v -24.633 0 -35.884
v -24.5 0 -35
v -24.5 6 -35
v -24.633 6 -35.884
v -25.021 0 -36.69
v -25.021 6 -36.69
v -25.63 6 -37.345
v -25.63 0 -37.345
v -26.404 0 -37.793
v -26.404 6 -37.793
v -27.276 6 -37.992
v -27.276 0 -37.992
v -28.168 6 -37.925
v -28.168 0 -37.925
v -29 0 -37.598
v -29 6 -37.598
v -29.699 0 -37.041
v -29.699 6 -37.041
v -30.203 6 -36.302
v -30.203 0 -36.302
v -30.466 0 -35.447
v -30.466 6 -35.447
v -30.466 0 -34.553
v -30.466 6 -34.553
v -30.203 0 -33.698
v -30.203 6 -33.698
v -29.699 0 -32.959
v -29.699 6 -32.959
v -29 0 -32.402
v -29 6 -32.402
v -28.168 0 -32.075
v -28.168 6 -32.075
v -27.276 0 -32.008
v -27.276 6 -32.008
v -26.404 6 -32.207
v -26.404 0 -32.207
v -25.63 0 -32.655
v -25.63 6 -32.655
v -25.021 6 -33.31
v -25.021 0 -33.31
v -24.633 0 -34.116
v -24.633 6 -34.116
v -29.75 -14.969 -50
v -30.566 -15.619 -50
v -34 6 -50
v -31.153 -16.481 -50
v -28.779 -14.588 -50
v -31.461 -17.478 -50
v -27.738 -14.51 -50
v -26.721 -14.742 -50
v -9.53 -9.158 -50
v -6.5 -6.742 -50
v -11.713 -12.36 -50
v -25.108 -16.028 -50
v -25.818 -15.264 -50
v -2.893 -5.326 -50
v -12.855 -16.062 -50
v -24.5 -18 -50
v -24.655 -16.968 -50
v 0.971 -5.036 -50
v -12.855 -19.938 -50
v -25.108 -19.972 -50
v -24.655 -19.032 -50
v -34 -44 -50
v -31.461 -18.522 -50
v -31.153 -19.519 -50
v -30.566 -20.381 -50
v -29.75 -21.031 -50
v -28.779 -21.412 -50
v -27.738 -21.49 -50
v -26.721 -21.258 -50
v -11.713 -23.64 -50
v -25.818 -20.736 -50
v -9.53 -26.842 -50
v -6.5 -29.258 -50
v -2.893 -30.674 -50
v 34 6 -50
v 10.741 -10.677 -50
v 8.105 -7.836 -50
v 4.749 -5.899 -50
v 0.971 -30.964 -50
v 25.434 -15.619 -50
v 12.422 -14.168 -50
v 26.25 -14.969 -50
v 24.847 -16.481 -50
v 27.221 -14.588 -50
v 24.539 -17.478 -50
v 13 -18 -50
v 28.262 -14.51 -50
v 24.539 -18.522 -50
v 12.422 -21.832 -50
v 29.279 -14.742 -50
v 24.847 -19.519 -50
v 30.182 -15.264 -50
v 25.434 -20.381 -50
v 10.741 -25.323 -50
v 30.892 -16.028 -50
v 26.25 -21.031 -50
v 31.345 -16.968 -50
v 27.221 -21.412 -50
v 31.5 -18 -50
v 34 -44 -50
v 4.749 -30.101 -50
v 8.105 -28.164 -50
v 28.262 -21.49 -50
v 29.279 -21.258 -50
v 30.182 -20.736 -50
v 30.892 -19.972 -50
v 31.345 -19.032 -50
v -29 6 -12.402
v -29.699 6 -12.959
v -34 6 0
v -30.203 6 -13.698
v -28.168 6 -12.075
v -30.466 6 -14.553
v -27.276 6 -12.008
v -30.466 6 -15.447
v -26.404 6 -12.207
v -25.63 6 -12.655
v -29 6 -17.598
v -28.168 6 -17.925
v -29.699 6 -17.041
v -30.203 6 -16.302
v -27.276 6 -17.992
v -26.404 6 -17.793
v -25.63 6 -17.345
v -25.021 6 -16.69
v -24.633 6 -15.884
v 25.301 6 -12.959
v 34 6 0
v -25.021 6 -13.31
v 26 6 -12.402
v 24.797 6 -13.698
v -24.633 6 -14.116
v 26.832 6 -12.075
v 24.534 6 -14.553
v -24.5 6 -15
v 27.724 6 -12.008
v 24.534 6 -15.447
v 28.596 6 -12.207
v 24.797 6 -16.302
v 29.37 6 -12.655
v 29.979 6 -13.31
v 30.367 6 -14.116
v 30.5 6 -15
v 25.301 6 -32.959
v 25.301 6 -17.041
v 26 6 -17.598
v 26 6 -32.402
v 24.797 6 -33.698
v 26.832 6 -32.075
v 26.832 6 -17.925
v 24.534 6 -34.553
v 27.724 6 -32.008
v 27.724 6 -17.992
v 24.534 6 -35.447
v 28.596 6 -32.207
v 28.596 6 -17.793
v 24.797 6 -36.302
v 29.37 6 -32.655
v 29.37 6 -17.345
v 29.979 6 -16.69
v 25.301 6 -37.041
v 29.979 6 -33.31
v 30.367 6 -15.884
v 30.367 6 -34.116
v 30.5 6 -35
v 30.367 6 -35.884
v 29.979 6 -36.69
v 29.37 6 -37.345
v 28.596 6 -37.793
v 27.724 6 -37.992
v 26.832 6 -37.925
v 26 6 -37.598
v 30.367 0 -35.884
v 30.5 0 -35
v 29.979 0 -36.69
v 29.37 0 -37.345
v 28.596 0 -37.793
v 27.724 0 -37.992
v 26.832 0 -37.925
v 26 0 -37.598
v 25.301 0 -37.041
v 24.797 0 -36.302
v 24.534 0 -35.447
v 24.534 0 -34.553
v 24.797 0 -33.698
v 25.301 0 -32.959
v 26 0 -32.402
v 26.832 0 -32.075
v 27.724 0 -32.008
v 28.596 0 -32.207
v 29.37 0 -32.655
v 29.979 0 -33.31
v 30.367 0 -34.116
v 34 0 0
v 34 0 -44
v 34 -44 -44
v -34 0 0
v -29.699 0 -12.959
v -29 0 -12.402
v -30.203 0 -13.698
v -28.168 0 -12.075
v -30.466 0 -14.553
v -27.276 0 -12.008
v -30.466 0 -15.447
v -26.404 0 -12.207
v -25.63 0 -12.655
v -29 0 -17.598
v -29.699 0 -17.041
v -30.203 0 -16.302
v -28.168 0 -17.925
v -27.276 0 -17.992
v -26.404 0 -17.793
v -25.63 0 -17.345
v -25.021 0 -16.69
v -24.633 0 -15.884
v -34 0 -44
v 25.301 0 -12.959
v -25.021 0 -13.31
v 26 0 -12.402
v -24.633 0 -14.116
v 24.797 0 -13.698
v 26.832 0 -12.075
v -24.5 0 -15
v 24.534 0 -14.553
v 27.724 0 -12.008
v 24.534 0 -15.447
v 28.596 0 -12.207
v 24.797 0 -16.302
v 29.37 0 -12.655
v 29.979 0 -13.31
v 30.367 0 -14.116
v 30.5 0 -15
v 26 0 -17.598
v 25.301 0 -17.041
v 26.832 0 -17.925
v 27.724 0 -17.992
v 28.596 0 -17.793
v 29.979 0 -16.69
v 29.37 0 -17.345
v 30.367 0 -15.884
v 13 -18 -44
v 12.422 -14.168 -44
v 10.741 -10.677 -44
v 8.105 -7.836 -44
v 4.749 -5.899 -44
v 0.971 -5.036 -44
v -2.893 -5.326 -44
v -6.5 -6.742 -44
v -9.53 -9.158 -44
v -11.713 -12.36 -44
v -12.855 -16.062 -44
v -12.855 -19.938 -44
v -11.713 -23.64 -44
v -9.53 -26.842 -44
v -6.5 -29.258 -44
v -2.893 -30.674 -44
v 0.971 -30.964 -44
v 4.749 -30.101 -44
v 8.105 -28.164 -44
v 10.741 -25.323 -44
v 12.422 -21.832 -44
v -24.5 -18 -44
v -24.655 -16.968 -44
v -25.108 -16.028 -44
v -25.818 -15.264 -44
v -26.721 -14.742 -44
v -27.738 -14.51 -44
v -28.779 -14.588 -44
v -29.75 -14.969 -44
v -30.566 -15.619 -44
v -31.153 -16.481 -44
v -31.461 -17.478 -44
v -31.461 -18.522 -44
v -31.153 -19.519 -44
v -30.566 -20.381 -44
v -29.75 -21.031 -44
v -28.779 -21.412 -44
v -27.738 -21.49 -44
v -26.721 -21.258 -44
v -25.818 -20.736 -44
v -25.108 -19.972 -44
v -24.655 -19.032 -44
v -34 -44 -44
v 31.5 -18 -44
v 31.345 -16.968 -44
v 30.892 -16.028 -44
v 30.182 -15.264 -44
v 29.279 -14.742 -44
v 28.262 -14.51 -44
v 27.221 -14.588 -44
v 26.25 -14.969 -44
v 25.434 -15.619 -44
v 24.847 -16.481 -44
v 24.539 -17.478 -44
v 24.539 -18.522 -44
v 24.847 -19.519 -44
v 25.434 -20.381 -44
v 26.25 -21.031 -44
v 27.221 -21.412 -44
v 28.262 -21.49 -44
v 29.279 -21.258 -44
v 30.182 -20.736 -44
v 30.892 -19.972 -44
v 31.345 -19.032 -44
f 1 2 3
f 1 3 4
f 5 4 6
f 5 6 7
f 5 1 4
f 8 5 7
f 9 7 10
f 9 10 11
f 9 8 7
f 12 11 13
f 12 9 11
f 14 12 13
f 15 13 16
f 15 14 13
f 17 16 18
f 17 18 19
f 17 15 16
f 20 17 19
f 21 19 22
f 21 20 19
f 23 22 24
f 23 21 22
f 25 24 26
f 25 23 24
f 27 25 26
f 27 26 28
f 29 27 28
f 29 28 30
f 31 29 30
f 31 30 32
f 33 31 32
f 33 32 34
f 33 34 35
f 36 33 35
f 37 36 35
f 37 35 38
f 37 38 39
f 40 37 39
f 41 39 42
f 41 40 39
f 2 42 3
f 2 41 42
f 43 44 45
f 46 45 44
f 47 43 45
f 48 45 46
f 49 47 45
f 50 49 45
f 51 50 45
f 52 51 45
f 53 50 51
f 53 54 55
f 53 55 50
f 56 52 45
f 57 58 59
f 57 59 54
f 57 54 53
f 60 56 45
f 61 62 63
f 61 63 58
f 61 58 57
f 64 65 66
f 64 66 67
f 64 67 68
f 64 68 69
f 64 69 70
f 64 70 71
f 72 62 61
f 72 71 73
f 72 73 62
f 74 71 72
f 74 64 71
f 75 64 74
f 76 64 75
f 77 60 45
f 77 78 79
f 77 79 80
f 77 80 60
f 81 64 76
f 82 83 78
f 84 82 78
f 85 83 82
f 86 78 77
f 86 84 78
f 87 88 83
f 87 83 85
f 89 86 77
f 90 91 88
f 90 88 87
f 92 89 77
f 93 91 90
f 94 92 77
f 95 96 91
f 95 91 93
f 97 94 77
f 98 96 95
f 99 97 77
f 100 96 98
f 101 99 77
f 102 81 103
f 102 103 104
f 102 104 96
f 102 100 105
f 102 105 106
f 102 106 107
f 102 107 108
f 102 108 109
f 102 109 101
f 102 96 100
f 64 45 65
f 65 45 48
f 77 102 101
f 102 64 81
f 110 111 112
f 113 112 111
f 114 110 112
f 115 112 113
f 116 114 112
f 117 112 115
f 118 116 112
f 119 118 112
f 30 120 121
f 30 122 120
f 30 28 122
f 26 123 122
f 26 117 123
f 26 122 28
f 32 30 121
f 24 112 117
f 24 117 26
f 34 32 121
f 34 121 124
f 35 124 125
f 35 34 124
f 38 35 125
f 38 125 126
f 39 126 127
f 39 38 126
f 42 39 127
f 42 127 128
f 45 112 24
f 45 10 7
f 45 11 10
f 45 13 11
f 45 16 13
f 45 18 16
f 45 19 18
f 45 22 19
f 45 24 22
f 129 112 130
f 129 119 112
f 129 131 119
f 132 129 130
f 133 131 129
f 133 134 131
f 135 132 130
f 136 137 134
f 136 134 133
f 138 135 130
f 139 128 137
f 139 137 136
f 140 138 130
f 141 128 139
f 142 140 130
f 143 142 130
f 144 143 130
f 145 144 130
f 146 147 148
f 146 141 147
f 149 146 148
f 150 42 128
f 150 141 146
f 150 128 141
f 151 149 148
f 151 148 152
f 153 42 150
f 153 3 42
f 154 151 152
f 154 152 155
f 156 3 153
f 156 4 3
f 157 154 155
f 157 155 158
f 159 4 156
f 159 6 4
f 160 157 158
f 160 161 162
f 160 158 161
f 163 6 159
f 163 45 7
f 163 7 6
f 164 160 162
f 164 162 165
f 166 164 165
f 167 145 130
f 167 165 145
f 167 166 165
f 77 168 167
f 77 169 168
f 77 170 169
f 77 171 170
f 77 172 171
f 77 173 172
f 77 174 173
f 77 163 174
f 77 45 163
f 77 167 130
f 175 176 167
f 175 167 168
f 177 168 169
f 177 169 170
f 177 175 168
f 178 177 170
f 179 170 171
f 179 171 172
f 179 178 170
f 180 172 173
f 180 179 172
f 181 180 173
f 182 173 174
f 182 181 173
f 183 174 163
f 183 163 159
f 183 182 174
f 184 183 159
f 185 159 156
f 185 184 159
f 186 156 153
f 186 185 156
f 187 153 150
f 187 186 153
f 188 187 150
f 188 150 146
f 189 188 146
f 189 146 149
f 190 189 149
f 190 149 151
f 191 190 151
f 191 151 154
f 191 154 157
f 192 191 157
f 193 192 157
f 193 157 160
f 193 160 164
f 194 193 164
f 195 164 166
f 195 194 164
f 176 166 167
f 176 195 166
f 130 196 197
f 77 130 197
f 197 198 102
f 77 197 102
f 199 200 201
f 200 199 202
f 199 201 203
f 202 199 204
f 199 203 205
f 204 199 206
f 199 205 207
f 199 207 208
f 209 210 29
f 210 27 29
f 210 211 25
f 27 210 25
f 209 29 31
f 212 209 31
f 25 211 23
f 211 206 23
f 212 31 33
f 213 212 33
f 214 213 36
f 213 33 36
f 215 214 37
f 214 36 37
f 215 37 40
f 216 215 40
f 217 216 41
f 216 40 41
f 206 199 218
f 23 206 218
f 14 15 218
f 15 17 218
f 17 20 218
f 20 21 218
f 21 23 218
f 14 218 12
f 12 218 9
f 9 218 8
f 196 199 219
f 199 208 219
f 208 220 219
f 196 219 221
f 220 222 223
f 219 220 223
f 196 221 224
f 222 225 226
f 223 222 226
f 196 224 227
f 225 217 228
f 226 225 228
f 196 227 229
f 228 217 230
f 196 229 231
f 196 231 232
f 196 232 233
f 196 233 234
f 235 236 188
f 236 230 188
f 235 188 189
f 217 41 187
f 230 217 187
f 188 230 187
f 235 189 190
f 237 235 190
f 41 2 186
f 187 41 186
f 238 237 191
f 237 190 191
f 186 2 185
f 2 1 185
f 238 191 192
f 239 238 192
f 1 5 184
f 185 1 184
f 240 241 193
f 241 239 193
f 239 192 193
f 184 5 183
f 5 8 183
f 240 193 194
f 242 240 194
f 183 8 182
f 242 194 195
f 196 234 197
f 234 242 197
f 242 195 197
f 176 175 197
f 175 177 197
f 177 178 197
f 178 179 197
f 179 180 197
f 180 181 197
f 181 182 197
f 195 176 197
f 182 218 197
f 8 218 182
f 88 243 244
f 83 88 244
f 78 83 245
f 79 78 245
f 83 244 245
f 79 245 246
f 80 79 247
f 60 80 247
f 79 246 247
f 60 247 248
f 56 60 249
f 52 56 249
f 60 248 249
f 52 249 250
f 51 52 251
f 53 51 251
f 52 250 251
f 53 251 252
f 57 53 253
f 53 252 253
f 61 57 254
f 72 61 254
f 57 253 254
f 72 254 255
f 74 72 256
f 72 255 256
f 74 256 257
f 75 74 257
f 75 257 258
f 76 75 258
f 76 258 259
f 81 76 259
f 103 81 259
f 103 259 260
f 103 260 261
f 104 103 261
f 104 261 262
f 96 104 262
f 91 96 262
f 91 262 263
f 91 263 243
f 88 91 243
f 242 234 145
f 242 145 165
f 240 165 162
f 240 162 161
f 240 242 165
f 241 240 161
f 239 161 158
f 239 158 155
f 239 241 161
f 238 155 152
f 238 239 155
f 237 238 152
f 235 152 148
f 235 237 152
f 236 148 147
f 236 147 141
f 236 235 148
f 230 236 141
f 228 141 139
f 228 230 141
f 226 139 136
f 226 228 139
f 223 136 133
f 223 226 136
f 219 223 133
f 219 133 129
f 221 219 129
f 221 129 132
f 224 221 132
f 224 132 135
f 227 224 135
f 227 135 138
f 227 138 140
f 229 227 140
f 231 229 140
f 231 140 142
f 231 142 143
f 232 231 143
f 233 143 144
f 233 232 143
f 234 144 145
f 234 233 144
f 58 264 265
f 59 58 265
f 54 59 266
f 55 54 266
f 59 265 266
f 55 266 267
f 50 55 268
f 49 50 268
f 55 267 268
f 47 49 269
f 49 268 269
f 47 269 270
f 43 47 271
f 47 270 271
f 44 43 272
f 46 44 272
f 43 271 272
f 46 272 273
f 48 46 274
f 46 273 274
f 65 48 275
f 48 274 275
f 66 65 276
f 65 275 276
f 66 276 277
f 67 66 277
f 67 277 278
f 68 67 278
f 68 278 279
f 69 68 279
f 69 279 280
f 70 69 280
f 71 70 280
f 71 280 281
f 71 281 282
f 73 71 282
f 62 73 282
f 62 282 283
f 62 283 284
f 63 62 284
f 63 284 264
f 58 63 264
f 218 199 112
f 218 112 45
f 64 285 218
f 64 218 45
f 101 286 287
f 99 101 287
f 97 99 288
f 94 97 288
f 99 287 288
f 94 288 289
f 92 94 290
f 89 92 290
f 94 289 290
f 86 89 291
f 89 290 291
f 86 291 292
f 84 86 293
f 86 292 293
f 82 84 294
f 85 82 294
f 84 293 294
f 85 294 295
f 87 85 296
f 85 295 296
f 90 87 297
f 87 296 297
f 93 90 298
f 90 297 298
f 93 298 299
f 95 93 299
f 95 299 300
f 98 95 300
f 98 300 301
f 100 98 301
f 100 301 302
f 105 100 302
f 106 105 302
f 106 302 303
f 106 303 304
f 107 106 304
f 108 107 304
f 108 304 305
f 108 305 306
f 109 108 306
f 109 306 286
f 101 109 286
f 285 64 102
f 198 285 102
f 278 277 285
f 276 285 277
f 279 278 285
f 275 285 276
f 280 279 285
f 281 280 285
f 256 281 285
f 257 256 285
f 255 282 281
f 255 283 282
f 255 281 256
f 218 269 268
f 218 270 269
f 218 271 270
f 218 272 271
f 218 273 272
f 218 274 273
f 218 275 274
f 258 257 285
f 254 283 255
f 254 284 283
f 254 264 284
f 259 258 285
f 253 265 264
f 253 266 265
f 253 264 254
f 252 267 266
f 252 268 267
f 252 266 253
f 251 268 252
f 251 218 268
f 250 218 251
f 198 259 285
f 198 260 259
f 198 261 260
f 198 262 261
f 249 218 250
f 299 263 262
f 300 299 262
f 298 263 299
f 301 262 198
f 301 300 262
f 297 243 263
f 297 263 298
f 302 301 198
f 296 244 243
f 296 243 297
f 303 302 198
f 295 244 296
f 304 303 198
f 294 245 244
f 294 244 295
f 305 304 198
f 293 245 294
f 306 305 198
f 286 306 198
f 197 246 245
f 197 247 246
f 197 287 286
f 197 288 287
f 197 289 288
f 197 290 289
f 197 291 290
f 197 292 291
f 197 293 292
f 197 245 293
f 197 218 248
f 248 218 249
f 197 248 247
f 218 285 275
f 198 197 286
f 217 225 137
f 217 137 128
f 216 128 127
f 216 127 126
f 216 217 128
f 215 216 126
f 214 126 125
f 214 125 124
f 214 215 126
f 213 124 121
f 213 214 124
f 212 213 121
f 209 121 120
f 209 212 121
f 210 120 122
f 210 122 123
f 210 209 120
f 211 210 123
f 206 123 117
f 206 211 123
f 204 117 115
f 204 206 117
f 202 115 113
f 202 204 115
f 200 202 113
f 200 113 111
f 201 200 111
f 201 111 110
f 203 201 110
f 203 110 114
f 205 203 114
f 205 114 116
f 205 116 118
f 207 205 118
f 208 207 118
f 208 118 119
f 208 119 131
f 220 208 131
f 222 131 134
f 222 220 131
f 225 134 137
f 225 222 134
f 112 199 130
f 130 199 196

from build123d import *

# Parameters (mm, degrees)
SKETCH_1_W          = 68
SKETCH_1_H          = 50
SKETCH_1_R          = 3
EXTRUDE_1_DEPTH     = 6
SKETCH_3_W          = 68
SKETCH_3_H          = 6
EXTRUDE_2_DEPTH     = 50
CUT_EXTRUDE_1_REACH = 8
SKETCH_4_R          = 13
SKETCH_4_R_2        = 3.5


with BuildPart() as part:
    # 草图1 → 凸台-拉伸1 (new body)
    with BuildSketch(Plane(origin=(0, 0, 0), x_dir=(1, 0, 0), z_dir=(0, 1, 0))):
        with Locations((0, 25)):
            Rectangle(SKETCH_1_W, SKETCH_1_H)
        with Locations((-27.5, 35)):
            Circle(SKETCH_1_R, mode=Mode.SUBTRACT)
        with Locations((27.5, 35)):
            Circle(SKETCH_1_R, mode=Mode.SUBTRACT)
        with Locations((-27.5, 15)):
            Circle(SKETCH_1_R, mode=Mode.SUBTRACT)
        with Locations((27.5, 15)):
            Circle(SKETCH_1_R, mode=Mode.SUBTRACT)
    extrude(amount=EXTRUDE_1_DEPTH)

    # 草图3 → 凸台-拉伸2 (add)
    with BuildSketch(Plane(origin=(0, 6, 0), x_dir=(1, 0, 0), z_dir=(0, 1, 0))):
        with Locations((0, 47)):
            Rectangle(SKETCH_3_W, SKETCH_3_H)
    extrude(amount=-EXTRUDE_2_DEPTH)

    # 草图4 → 切除-拉伸1 (cut, up to next)
    with BuildSketch(Plane.XY.offset(-44), mode=Mode.PRIVATE) as cut_extrude_1_sk1:
        with Locations((0, -18)):
            Circle(SKETCH_4_R)
    cut_extrude_1_tool1 = extrude(cut_extrude_1_sk1.sketch, amount=-CUT_EXTRUDE_1_REACH, mode=Mode.PRIVATE) & part.part
    add(cut_extrude_1_tool1.solids().sort_by_distance((0, -18, -44))[0], mode=Mode.SUBTRACT)
    # 草图4 → 切除-拉伸1 (cut, up to next)
    with BuildSketch(Plane.XY.offset(-44), mode=Mode.PRIVATE) as cut_extrude_1_sk2:
        with Locations((28, -18)):
            Circle(SKETCH_4_R_2)
    cut_extrude_1_tool2 = extrude(cut_extrude_1_sk2.sketch, amount=-CUT_EXTRUDE_1_REACH, mode=Mode.PRIVATE) & part.part
    add(cut_extrude_1_tool2.solids().sort_by_distance((28, -18, -44))[0], mode=Mode.SUBTRACT)
    # 草图4 → 切除-拉伸1 (cut, up to next)
    with BuildSketch(Plane.XY.offset(-44), mode=Mode.PRIVATE) as cut_extrude_1_sk3:
        with Locations((-28, -18)):
            Circle(SKETCH_4_R_2)
    cut_extrude_1_tool3 = extrude(cut_extrude_1_sk3.sketch, amount=-CUT_EXTRUDE_1_REACH, mode=Mode.PRIVATE) & part.part
    add(cut_extrude_1_tool3.solids().sort_by_distance((-28, -18, -44))[0], mode=Mode.SUBTRACT)


solid = part.part
